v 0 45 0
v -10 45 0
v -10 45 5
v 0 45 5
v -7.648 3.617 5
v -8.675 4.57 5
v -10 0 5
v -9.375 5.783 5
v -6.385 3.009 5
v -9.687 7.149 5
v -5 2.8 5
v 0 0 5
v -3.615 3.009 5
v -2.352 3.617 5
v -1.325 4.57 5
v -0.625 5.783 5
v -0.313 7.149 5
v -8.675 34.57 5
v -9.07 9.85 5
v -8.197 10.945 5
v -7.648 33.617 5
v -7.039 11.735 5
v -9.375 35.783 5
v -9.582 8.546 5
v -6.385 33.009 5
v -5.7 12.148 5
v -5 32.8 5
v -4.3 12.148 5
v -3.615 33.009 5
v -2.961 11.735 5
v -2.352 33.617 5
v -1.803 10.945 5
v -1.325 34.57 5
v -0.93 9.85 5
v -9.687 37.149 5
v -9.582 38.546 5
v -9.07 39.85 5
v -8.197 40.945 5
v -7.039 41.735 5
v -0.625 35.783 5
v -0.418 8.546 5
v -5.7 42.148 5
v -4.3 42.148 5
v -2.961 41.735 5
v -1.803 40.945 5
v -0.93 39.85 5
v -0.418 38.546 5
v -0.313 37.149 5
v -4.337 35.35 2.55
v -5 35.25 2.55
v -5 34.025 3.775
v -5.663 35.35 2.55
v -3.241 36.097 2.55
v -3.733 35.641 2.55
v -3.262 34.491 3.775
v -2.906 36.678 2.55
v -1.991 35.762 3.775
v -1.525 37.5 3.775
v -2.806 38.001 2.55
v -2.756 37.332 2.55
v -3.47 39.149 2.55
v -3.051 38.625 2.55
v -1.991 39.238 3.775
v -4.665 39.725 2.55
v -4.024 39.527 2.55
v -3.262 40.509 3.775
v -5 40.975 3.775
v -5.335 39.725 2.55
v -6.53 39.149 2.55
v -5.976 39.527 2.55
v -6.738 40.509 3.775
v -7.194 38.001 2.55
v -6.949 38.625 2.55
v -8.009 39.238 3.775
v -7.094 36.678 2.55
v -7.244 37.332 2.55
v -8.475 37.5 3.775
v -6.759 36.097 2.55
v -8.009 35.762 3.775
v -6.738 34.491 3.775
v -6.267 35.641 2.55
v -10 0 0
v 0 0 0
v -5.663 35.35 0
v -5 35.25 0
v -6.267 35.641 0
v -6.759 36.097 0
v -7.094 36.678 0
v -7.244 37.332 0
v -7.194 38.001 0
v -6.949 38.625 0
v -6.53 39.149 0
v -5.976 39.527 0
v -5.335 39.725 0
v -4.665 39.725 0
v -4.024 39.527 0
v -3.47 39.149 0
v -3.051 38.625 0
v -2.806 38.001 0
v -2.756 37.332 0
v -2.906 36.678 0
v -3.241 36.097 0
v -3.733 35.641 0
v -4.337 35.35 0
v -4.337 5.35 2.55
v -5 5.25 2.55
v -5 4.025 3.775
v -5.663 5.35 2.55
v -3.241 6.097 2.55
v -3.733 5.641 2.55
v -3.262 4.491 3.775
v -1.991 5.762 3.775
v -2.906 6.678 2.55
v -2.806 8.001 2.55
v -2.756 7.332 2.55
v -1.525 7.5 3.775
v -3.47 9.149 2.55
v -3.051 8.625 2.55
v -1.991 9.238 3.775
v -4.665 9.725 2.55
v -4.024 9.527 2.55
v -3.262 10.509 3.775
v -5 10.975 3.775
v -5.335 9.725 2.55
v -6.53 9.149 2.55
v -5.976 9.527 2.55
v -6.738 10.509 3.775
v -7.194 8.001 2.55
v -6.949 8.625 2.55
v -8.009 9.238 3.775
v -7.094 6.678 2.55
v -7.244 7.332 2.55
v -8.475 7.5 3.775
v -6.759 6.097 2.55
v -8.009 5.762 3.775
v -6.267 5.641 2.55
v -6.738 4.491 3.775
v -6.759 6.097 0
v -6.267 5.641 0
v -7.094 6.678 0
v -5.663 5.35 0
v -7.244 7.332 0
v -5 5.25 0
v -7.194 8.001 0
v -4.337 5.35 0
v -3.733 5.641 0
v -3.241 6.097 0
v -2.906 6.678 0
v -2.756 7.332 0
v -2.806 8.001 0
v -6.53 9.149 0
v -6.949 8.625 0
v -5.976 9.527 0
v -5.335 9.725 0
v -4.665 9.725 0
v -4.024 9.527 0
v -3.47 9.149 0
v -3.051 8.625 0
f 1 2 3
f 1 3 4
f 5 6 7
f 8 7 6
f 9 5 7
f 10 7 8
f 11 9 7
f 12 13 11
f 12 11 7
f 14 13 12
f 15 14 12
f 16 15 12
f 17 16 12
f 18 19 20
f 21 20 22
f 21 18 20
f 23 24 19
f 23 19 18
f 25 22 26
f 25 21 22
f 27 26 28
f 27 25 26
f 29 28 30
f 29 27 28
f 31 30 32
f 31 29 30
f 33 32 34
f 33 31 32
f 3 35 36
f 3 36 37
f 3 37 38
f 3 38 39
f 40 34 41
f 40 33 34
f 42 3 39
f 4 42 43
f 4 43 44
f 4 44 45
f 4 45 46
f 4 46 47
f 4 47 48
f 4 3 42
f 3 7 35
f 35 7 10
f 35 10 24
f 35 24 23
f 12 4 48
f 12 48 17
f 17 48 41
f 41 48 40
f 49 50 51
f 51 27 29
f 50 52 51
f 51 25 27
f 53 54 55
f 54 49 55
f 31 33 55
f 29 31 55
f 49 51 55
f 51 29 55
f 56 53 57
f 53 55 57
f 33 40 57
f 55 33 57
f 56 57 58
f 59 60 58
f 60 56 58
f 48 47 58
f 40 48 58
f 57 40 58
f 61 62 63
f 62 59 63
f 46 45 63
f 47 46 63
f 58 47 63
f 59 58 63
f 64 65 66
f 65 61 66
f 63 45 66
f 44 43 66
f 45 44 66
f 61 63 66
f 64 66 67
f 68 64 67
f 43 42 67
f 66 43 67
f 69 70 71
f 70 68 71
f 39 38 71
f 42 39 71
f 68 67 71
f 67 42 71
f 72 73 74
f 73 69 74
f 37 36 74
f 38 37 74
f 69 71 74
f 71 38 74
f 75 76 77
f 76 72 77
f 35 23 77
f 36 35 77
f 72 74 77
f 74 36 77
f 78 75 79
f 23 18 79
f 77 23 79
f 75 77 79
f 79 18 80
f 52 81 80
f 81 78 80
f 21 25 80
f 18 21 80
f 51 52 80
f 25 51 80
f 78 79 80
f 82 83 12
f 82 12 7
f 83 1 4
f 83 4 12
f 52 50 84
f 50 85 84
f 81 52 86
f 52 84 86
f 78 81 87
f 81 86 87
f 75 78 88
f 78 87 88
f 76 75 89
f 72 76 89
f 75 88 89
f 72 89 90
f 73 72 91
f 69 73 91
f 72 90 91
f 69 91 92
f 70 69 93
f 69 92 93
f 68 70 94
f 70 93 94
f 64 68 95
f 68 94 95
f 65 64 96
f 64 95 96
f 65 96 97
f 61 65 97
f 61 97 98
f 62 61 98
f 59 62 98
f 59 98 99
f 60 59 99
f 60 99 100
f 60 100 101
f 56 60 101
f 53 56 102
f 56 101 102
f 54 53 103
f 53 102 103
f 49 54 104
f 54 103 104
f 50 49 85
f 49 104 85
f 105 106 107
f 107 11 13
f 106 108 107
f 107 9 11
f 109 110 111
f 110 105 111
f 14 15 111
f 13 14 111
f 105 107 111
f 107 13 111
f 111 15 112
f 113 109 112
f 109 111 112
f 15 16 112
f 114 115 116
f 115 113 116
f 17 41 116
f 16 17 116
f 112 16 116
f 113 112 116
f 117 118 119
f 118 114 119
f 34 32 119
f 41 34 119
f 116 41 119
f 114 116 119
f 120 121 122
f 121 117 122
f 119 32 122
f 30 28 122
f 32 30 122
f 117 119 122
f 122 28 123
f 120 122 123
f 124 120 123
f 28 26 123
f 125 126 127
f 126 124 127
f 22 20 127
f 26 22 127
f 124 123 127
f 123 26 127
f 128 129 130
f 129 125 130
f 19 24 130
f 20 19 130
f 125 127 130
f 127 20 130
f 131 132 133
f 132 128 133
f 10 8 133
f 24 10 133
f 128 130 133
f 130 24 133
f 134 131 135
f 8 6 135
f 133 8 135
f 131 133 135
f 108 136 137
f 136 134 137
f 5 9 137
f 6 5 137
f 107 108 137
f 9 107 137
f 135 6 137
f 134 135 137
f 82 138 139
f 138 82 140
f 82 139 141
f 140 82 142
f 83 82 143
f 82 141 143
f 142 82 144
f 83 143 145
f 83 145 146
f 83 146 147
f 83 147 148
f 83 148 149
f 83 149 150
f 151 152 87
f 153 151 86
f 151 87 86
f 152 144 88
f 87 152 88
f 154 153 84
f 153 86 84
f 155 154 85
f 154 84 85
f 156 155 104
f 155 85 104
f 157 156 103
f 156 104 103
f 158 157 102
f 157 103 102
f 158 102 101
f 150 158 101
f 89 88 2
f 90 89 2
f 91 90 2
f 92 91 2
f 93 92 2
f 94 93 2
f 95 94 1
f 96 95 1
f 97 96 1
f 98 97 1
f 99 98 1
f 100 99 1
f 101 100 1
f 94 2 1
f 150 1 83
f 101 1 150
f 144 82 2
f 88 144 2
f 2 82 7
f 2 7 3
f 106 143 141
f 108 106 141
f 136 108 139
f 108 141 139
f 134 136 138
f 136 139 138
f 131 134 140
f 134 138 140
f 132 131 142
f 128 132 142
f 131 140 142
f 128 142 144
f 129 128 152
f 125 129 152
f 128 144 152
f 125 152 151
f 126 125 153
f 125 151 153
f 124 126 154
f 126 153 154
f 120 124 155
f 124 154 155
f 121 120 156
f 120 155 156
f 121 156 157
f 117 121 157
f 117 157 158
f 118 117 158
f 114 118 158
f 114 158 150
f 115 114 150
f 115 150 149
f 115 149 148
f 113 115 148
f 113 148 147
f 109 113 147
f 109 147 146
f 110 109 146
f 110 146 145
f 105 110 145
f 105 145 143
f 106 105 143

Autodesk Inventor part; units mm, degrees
ref_plane "YZ Plane" through (0, 0, 0) normal (1, 0, 0) x (0, 1, 0)
ref_plane "XZ Plane" through (0, 0, 0) normal (0, 1, 0) x (-1, 0, 0)
ref_plane "XY Plane" through (0, 0, 0) normal (0, 0, 1) x (1, 0, 0)
sketch "Sketch1" plane through (0, 0, 0) normal (0, 0, 1) x (1, 0, 0)
  line L0 (0, 0) -> (-10, 0)
  line L1 (-10, 0) -> (-10, 45)
  line L2 (-10, 45) -> (0, 45)
  line L3 (0, 45) -> (0, 0)
  dimension "d0" = 10
  dimension "d1" = 45
extrude "Extrusion1" add sketch "Sketch1" along normal blind 5
sketch "Sketch2" plane through (0, 0, 5) normal (0, 0, 1) x (1, 0, 0)
  line L0 (0, 0) -> (0, 45) projected
  line L1 (-10, 45) -> (-10, 0) projected
  line L2 (0, 45) -> (-10, 45) projected
  line L3 (-10, 0) -> (0, 0) projected
  point P0 (-5, 37.5)
  point P1 (-5, 7.5)
  dimension "d4" = 5
  dimension "d5" = 5
  dimension "d6" = 7.5
  dimension "d7" = 7.5
  dimension "d8" = 30
hole "Hole1" at (-5, 37.5, 5) at (-5, 7.5, 5) direction (0, 0, -1) diameter 4.5 end through all countersink diameter 9.4 countersink angle 90 clearance for "Flat Head Machine Screw" size "M4" standard "Ansi Metric M Profile"
equation "\"d4\" = d5"
equation "\"d7\" = d6"
properties part number "Pancake_Side Piece Short 2" material "Wood (Birch)"
